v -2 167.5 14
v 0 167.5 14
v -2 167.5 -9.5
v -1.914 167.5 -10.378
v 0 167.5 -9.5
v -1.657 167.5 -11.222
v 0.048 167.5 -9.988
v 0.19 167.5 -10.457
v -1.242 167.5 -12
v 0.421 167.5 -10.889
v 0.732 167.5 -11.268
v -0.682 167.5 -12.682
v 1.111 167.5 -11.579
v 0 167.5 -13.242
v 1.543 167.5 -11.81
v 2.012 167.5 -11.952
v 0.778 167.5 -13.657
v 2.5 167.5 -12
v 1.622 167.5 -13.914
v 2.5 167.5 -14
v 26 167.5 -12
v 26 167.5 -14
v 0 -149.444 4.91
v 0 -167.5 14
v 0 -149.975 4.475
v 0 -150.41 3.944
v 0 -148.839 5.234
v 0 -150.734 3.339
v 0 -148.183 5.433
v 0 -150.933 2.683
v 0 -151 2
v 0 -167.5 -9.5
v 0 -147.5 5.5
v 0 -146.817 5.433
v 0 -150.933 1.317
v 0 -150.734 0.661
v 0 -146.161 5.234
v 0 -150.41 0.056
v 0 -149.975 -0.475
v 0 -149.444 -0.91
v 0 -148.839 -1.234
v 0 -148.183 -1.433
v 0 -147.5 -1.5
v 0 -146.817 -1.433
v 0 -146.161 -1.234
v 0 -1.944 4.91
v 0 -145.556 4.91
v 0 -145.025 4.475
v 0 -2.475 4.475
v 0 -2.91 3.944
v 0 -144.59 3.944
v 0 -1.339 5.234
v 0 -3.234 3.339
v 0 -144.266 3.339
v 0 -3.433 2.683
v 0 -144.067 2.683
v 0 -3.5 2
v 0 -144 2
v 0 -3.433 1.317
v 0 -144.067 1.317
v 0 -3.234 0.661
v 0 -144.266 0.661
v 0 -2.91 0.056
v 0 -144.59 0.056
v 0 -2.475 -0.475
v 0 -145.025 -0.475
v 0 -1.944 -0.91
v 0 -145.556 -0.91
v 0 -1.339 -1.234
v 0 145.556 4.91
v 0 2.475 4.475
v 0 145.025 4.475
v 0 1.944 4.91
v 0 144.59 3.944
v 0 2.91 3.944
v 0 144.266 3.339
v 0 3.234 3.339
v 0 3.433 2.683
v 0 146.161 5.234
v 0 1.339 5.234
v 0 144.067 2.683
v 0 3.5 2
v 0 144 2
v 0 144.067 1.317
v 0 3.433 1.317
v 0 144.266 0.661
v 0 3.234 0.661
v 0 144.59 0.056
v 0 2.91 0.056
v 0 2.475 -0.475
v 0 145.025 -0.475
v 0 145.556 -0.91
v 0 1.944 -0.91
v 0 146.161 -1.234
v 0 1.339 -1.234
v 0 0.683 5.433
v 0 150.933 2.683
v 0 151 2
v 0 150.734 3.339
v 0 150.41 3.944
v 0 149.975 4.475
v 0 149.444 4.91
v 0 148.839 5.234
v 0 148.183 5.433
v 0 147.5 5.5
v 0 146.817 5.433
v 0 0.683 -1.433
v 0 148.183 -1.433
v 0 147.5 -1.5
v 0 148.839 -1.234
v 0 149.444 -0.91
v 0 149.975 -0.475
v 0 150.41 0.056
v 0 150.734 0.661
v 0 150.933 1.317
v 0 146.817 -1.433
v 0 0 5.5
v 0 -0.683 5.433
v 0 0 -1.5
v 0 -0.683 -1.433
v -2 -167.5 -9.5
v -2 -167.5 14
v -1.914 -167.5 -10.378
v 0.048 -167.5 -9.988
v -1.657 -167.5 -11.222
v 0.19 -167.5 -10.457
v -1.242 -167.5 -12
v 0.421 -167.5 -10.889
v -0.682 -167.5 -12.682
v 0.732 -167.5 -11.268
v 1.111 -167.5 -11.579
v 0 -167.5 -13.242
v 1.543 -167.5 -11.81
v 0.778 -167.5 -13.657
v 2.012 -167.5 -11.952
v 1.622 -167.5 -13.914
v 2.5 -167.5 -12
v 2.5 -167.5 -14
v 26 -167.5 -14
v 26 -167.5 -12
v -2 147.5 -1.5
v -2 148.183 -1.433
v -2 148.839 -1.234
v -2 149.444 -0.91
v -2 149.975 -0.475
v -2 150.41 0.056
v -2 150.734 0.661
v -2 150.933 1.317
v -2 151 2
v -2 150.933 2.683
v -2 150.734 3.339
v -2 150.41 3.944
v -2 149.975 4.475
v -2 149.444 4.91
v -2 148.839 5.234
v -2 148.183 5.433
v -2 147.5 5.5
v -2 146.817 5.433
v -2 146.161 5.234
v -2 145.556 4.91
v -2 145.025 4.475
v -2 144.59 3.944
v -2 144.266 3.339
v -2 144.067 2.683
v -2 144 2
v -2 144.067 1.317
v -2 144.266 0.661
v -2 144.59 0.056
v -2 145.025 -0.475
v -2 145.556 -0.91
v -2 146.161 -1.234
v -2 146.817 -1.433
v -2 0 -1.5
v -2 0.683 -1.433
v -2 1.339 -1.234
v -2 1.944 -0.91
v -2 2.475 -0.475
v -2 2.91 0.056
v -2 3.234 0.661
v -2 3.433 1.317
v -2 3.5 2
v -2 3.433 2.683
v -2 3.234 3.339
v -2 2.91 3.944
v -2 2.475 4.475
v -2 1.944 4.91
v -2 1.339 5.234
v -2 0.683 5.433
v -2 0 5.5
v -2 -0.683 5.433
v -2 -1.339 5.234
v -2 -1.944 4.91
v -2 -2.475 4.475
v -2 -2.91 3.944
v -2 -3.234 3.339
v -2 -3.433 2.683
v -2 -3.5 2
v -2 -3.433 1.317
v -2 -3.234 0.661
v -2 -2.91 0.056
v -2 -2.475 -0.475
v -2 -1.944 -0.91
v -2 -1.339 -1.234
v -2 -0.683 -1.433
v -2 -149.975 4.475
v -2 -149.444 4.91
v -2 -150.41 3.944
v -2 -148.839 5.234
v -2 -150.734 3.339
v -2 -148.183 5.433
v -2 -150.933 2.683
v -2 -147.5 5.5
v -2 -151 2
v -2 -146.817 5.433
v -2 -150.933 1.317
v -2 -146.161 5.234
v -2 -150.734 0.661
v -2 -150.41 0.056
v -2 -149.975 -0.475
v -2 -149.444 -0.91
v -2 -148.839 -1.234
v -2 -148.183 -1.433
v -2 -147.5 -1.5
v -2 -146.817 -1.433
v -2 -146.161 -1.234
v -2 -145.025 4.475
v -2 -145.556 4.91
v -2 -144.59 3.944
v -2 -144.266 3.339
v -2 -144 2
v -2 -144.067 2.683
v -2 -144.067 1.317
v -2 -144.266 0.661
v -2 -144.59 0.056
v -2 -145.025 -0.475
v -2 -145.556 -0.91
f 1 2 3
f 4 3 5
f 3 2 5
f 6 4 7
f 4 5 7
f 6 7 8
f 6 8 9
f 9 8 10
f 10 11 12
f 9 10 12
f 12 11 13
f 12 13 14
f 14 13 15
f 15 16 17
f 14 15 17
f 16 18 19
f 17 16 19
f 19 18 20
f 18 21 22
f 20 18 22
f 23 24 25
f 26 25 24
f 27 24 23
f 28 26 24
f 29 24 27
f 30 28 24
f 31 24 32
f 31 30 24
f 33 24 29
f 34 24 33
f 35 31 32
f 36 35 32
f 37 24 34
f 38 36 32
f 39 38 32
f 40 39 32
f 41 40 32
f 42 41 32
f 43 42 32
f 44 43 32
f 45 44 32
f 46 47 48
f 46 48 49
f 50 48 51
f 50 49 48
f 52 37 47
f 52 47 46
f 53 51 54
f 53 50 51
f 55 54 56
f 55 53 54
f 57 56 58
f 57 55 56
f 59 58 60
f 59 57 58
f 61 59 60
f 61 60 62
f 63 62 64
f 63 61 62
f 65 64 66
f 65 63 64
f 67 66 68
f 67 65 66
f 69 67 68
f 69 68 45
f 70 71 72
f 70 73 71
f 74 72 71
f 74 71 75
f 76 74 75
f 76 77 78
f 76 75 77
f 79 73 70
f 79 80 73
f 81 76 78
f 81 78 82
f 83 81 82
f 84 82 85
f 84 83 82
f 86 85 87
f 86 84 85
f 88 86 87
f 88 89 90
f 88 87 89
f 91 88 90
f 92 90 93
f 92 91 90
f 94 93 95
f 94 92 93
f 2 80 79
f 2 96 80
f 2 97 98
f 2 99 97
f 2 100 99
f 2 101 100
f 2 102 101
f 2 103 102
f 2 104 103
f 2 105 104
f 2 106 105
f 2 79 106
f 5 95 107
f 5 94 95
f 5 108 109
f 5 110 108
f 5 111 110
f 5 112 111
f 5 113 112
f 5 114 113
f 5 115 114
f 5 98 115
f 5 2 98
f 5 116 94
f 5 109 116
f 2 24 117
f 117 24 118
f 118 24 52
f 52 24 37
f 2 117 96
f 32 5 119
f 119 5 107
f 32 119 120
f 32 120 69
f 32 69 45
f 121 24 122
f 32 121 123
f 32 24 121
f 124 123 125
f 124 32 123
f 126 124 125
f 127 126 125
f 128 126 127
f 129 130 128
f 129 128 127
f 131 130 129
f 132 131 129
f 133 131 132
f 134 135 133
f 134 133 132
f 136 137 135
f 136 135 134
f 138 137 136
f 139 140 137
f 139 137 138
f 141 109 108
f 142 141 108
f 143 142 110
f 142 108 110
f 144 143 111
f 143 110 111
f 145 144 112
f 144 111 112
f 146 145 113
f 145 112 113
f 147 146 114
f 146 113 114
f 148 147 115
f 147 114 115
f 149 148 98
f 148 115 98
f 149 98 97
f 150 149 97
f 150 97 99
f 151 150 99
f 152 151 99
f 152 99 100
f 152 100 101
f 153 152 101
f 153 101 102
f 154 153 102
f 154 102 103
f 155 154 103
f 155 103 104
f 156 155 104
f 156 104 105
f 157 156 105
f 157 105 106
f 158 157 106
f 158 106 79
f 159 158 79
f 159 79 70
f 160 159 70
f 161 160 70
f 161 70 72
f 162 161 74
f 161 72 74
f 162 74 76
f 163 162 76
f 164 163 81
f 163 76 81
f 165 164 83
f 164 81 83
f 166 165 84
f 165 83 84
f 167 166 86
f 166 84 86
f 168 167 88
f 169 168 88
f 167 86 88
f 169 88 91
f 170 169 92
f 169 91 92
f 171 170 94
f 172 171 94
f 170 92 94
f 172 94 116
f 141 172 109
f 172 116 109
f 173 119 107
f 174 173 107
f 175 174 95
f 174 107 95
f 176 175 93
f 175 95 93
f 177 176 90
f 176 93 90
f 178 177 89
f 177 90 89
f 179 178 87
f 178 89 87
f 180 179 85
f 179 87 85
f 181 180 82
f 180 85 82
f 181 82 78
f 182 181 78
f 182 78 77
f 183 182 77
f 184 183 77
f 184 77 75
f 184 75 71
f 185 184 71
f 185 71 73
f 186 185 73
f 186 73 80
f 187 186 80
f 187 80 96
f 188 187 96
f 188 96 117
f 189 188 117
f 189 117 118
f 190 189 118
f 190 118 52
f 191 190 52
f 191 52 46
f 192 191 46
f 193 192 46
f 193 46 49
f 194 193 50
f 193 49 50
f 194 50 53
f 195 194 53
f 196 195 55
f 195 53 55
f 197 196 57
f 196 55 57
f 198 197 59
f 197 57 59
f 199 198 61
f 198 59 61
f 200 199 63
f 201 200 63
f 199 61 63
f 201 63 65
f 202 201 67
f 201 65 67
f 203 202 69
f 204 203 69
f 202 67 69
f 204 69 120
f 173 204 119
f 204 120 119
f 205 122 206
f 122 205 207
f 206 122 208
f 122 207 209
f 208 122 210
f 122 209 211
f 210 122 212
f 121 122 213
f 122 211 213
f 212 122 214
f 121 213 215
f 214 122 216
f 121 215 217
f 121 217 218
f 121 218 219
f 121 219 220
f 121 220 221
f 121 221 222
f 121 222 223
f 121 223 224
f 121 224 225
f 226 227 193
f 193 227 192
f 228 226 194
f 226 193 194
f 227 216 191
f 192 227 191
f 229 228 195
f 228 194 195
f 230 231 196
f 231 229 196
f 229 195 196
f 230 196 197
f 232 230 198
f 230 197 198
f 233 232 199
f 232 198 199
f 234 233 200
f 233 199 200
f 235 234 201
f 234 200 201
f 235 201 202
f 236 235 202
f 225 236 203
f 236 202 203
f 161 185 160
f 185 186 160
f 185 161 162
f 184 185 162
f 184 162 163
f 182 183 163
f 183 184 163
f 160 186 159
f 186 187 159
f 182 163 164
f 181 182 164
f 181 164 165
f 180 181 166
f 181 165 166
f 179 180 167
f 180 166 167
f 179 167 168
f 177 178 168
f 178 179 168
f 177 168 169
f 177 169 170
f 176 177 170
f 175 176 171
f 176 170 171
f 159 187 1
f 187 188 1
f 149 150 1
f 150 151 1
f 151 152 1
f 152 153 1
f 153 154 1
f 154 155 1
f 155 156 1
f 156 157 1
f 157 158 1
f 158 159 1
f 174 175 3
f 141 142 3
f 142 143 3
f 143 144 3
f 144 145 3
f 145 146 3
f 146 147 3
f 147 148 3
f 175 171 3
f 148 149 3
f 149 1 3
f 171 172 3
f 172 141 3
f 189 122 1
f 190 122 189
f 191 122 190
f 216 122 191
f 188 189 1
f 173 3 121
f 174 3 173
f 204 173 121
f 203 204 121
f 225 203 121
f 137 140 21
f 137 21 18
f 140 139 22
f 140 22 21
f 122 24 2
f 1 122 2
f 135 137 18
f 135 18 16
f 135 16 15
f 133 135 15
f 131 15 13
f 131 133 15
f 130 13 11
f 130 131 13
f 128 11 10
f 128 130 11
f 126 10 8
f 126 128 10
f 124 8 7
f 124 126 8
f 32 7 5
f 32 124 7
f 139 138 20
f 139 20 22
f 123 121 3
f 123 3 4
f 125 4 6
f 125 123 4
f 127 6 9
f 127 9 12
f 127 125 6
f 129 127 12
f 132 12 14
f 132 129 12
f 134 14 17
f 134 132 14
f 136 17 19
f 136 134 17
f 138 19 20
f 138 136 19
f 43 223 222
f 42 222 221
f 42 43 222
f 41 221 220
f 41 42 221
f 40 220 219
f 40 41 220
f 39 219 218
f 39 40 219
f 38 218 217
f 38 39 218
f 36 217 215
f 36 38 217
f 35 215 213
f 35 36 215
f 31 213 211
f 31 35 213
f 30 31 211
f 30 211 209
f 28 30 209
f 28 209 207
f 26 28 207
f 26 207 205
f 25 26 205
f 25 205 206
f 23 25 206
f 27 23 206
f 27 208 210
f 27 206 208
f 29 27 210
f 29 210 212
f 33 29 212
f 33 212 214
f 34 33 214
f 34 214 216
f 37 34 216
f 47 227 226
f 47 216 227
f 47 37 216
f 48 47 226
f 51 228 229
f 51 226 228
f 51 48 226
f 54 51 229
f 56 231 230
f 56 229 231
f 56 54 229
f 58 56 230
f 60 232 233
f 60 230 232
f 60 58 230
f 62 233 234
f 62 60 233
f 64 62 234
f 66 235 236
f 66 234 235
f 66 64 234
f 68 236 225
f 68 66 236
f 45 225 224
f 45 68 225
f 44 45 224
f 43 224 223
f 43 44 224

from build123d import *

# Parameters (mm, degrees)
SKETCH1_W                    = 28
SKETCH1_H                    = 335
BASE_FLANGE1_DEPTH           = 2
EDGE_FLANGE1_STRIP_W         = 13
EDGE_FLANGE1_STRIP_H         = 2
EDGE_FLANGE1_STRIP_CUT_DEPTH = 335
EDGE_FLANGE1_DEPTH           = 335
SKETCH9_R                    = 3.5
CUT_EXTRUDE1_DEPTH           = 10
LPATTERN1_COUNT              = 2
LPATTERN1_PITCH              = 147.5


# Sheet-metal steps are written as plain solids
with BuildPart() as part:
    # Sketch1 → Base-Flange1 (new body)
    with BuildSketch(Plane(origin=(0, 0, 0), x_dir=(0, 0, -1), z_dir=(1, 0, 0))):
        Rectangle(SKETCH1_W, SKETCH1_H)
    extrude(amount=-BASE_FLANGE1_DEPTH)

    # Edge-Flange1 strip (across the edge) → Edge-Flange1 strip cut (cut)
    with BuildSketch(Plane(origin=(0, -167.5, -14), x_dir=(0, 0, 1), z_dir=(0, 1, 0))):
        with Locations((-2, -1)):
            Rectangle(EDGE_FLANGE1_STRIP_W, EDGE_FLANGE1_STRIP_H)
    extrude(amount=EDGE_FLANGE1_STRIP_CUT_DEPTH, mode=Mode.SUBTRACT)

    # Edge-Flange1 section (across the edge) → Edge-Flange1 (add)
    with BuildSketch(Plane(origin=(0, -167.5, -14), x_dir=(0, 0, 1), z_dir=(0, 1, 0))):
        with BuildLine():
            Line((0, 2.5), (0, 26))
            Line((0, 26), (2, 26))
            Line((2, 26), (2, 2.5))
            ThreePointArc((2, 2.5), (2.732233047, 0.732233047), (4.5, 0))
            Line((4.5, 0), (4.5, -2))
            ThreePointArc((4.5, -2), (1.318019485, -0.681980515), (0, 2.5))
        make_face()
    extrude(amount=EDGE_FLANGE1_DEPTH)

    # Sketch9 → Cut-Extrude1 (cut)
    with BuildSketch(Plane(origin=(0, 0, 0), x_dir=(0, 0, -1), z_dir=(1, 0, 0))):
        with Locations((-2, 147.5)):
            Circle(SKETCH9_R)
    cut_extrude1 = extrude(amount=-CUT_EXTRUDE1_DEPTH, mode=Mode.SUBTRACT)

    # Mirror1: Cut-Extrude1 across plane
    add(cut_extrude1.mirror(Plane.ZX), mode=Mode.SUBTRACT)

    # LPattern1: Cut-Extrude1 ×2
    with Locations(*[(0, -i * LPATTERN1_PITCH, 0) for i in range(1, LPATTERN1_COUNT)]):
        add(cut_extrude1, mode=Mode.SUBTRACT)


solid = part.part
